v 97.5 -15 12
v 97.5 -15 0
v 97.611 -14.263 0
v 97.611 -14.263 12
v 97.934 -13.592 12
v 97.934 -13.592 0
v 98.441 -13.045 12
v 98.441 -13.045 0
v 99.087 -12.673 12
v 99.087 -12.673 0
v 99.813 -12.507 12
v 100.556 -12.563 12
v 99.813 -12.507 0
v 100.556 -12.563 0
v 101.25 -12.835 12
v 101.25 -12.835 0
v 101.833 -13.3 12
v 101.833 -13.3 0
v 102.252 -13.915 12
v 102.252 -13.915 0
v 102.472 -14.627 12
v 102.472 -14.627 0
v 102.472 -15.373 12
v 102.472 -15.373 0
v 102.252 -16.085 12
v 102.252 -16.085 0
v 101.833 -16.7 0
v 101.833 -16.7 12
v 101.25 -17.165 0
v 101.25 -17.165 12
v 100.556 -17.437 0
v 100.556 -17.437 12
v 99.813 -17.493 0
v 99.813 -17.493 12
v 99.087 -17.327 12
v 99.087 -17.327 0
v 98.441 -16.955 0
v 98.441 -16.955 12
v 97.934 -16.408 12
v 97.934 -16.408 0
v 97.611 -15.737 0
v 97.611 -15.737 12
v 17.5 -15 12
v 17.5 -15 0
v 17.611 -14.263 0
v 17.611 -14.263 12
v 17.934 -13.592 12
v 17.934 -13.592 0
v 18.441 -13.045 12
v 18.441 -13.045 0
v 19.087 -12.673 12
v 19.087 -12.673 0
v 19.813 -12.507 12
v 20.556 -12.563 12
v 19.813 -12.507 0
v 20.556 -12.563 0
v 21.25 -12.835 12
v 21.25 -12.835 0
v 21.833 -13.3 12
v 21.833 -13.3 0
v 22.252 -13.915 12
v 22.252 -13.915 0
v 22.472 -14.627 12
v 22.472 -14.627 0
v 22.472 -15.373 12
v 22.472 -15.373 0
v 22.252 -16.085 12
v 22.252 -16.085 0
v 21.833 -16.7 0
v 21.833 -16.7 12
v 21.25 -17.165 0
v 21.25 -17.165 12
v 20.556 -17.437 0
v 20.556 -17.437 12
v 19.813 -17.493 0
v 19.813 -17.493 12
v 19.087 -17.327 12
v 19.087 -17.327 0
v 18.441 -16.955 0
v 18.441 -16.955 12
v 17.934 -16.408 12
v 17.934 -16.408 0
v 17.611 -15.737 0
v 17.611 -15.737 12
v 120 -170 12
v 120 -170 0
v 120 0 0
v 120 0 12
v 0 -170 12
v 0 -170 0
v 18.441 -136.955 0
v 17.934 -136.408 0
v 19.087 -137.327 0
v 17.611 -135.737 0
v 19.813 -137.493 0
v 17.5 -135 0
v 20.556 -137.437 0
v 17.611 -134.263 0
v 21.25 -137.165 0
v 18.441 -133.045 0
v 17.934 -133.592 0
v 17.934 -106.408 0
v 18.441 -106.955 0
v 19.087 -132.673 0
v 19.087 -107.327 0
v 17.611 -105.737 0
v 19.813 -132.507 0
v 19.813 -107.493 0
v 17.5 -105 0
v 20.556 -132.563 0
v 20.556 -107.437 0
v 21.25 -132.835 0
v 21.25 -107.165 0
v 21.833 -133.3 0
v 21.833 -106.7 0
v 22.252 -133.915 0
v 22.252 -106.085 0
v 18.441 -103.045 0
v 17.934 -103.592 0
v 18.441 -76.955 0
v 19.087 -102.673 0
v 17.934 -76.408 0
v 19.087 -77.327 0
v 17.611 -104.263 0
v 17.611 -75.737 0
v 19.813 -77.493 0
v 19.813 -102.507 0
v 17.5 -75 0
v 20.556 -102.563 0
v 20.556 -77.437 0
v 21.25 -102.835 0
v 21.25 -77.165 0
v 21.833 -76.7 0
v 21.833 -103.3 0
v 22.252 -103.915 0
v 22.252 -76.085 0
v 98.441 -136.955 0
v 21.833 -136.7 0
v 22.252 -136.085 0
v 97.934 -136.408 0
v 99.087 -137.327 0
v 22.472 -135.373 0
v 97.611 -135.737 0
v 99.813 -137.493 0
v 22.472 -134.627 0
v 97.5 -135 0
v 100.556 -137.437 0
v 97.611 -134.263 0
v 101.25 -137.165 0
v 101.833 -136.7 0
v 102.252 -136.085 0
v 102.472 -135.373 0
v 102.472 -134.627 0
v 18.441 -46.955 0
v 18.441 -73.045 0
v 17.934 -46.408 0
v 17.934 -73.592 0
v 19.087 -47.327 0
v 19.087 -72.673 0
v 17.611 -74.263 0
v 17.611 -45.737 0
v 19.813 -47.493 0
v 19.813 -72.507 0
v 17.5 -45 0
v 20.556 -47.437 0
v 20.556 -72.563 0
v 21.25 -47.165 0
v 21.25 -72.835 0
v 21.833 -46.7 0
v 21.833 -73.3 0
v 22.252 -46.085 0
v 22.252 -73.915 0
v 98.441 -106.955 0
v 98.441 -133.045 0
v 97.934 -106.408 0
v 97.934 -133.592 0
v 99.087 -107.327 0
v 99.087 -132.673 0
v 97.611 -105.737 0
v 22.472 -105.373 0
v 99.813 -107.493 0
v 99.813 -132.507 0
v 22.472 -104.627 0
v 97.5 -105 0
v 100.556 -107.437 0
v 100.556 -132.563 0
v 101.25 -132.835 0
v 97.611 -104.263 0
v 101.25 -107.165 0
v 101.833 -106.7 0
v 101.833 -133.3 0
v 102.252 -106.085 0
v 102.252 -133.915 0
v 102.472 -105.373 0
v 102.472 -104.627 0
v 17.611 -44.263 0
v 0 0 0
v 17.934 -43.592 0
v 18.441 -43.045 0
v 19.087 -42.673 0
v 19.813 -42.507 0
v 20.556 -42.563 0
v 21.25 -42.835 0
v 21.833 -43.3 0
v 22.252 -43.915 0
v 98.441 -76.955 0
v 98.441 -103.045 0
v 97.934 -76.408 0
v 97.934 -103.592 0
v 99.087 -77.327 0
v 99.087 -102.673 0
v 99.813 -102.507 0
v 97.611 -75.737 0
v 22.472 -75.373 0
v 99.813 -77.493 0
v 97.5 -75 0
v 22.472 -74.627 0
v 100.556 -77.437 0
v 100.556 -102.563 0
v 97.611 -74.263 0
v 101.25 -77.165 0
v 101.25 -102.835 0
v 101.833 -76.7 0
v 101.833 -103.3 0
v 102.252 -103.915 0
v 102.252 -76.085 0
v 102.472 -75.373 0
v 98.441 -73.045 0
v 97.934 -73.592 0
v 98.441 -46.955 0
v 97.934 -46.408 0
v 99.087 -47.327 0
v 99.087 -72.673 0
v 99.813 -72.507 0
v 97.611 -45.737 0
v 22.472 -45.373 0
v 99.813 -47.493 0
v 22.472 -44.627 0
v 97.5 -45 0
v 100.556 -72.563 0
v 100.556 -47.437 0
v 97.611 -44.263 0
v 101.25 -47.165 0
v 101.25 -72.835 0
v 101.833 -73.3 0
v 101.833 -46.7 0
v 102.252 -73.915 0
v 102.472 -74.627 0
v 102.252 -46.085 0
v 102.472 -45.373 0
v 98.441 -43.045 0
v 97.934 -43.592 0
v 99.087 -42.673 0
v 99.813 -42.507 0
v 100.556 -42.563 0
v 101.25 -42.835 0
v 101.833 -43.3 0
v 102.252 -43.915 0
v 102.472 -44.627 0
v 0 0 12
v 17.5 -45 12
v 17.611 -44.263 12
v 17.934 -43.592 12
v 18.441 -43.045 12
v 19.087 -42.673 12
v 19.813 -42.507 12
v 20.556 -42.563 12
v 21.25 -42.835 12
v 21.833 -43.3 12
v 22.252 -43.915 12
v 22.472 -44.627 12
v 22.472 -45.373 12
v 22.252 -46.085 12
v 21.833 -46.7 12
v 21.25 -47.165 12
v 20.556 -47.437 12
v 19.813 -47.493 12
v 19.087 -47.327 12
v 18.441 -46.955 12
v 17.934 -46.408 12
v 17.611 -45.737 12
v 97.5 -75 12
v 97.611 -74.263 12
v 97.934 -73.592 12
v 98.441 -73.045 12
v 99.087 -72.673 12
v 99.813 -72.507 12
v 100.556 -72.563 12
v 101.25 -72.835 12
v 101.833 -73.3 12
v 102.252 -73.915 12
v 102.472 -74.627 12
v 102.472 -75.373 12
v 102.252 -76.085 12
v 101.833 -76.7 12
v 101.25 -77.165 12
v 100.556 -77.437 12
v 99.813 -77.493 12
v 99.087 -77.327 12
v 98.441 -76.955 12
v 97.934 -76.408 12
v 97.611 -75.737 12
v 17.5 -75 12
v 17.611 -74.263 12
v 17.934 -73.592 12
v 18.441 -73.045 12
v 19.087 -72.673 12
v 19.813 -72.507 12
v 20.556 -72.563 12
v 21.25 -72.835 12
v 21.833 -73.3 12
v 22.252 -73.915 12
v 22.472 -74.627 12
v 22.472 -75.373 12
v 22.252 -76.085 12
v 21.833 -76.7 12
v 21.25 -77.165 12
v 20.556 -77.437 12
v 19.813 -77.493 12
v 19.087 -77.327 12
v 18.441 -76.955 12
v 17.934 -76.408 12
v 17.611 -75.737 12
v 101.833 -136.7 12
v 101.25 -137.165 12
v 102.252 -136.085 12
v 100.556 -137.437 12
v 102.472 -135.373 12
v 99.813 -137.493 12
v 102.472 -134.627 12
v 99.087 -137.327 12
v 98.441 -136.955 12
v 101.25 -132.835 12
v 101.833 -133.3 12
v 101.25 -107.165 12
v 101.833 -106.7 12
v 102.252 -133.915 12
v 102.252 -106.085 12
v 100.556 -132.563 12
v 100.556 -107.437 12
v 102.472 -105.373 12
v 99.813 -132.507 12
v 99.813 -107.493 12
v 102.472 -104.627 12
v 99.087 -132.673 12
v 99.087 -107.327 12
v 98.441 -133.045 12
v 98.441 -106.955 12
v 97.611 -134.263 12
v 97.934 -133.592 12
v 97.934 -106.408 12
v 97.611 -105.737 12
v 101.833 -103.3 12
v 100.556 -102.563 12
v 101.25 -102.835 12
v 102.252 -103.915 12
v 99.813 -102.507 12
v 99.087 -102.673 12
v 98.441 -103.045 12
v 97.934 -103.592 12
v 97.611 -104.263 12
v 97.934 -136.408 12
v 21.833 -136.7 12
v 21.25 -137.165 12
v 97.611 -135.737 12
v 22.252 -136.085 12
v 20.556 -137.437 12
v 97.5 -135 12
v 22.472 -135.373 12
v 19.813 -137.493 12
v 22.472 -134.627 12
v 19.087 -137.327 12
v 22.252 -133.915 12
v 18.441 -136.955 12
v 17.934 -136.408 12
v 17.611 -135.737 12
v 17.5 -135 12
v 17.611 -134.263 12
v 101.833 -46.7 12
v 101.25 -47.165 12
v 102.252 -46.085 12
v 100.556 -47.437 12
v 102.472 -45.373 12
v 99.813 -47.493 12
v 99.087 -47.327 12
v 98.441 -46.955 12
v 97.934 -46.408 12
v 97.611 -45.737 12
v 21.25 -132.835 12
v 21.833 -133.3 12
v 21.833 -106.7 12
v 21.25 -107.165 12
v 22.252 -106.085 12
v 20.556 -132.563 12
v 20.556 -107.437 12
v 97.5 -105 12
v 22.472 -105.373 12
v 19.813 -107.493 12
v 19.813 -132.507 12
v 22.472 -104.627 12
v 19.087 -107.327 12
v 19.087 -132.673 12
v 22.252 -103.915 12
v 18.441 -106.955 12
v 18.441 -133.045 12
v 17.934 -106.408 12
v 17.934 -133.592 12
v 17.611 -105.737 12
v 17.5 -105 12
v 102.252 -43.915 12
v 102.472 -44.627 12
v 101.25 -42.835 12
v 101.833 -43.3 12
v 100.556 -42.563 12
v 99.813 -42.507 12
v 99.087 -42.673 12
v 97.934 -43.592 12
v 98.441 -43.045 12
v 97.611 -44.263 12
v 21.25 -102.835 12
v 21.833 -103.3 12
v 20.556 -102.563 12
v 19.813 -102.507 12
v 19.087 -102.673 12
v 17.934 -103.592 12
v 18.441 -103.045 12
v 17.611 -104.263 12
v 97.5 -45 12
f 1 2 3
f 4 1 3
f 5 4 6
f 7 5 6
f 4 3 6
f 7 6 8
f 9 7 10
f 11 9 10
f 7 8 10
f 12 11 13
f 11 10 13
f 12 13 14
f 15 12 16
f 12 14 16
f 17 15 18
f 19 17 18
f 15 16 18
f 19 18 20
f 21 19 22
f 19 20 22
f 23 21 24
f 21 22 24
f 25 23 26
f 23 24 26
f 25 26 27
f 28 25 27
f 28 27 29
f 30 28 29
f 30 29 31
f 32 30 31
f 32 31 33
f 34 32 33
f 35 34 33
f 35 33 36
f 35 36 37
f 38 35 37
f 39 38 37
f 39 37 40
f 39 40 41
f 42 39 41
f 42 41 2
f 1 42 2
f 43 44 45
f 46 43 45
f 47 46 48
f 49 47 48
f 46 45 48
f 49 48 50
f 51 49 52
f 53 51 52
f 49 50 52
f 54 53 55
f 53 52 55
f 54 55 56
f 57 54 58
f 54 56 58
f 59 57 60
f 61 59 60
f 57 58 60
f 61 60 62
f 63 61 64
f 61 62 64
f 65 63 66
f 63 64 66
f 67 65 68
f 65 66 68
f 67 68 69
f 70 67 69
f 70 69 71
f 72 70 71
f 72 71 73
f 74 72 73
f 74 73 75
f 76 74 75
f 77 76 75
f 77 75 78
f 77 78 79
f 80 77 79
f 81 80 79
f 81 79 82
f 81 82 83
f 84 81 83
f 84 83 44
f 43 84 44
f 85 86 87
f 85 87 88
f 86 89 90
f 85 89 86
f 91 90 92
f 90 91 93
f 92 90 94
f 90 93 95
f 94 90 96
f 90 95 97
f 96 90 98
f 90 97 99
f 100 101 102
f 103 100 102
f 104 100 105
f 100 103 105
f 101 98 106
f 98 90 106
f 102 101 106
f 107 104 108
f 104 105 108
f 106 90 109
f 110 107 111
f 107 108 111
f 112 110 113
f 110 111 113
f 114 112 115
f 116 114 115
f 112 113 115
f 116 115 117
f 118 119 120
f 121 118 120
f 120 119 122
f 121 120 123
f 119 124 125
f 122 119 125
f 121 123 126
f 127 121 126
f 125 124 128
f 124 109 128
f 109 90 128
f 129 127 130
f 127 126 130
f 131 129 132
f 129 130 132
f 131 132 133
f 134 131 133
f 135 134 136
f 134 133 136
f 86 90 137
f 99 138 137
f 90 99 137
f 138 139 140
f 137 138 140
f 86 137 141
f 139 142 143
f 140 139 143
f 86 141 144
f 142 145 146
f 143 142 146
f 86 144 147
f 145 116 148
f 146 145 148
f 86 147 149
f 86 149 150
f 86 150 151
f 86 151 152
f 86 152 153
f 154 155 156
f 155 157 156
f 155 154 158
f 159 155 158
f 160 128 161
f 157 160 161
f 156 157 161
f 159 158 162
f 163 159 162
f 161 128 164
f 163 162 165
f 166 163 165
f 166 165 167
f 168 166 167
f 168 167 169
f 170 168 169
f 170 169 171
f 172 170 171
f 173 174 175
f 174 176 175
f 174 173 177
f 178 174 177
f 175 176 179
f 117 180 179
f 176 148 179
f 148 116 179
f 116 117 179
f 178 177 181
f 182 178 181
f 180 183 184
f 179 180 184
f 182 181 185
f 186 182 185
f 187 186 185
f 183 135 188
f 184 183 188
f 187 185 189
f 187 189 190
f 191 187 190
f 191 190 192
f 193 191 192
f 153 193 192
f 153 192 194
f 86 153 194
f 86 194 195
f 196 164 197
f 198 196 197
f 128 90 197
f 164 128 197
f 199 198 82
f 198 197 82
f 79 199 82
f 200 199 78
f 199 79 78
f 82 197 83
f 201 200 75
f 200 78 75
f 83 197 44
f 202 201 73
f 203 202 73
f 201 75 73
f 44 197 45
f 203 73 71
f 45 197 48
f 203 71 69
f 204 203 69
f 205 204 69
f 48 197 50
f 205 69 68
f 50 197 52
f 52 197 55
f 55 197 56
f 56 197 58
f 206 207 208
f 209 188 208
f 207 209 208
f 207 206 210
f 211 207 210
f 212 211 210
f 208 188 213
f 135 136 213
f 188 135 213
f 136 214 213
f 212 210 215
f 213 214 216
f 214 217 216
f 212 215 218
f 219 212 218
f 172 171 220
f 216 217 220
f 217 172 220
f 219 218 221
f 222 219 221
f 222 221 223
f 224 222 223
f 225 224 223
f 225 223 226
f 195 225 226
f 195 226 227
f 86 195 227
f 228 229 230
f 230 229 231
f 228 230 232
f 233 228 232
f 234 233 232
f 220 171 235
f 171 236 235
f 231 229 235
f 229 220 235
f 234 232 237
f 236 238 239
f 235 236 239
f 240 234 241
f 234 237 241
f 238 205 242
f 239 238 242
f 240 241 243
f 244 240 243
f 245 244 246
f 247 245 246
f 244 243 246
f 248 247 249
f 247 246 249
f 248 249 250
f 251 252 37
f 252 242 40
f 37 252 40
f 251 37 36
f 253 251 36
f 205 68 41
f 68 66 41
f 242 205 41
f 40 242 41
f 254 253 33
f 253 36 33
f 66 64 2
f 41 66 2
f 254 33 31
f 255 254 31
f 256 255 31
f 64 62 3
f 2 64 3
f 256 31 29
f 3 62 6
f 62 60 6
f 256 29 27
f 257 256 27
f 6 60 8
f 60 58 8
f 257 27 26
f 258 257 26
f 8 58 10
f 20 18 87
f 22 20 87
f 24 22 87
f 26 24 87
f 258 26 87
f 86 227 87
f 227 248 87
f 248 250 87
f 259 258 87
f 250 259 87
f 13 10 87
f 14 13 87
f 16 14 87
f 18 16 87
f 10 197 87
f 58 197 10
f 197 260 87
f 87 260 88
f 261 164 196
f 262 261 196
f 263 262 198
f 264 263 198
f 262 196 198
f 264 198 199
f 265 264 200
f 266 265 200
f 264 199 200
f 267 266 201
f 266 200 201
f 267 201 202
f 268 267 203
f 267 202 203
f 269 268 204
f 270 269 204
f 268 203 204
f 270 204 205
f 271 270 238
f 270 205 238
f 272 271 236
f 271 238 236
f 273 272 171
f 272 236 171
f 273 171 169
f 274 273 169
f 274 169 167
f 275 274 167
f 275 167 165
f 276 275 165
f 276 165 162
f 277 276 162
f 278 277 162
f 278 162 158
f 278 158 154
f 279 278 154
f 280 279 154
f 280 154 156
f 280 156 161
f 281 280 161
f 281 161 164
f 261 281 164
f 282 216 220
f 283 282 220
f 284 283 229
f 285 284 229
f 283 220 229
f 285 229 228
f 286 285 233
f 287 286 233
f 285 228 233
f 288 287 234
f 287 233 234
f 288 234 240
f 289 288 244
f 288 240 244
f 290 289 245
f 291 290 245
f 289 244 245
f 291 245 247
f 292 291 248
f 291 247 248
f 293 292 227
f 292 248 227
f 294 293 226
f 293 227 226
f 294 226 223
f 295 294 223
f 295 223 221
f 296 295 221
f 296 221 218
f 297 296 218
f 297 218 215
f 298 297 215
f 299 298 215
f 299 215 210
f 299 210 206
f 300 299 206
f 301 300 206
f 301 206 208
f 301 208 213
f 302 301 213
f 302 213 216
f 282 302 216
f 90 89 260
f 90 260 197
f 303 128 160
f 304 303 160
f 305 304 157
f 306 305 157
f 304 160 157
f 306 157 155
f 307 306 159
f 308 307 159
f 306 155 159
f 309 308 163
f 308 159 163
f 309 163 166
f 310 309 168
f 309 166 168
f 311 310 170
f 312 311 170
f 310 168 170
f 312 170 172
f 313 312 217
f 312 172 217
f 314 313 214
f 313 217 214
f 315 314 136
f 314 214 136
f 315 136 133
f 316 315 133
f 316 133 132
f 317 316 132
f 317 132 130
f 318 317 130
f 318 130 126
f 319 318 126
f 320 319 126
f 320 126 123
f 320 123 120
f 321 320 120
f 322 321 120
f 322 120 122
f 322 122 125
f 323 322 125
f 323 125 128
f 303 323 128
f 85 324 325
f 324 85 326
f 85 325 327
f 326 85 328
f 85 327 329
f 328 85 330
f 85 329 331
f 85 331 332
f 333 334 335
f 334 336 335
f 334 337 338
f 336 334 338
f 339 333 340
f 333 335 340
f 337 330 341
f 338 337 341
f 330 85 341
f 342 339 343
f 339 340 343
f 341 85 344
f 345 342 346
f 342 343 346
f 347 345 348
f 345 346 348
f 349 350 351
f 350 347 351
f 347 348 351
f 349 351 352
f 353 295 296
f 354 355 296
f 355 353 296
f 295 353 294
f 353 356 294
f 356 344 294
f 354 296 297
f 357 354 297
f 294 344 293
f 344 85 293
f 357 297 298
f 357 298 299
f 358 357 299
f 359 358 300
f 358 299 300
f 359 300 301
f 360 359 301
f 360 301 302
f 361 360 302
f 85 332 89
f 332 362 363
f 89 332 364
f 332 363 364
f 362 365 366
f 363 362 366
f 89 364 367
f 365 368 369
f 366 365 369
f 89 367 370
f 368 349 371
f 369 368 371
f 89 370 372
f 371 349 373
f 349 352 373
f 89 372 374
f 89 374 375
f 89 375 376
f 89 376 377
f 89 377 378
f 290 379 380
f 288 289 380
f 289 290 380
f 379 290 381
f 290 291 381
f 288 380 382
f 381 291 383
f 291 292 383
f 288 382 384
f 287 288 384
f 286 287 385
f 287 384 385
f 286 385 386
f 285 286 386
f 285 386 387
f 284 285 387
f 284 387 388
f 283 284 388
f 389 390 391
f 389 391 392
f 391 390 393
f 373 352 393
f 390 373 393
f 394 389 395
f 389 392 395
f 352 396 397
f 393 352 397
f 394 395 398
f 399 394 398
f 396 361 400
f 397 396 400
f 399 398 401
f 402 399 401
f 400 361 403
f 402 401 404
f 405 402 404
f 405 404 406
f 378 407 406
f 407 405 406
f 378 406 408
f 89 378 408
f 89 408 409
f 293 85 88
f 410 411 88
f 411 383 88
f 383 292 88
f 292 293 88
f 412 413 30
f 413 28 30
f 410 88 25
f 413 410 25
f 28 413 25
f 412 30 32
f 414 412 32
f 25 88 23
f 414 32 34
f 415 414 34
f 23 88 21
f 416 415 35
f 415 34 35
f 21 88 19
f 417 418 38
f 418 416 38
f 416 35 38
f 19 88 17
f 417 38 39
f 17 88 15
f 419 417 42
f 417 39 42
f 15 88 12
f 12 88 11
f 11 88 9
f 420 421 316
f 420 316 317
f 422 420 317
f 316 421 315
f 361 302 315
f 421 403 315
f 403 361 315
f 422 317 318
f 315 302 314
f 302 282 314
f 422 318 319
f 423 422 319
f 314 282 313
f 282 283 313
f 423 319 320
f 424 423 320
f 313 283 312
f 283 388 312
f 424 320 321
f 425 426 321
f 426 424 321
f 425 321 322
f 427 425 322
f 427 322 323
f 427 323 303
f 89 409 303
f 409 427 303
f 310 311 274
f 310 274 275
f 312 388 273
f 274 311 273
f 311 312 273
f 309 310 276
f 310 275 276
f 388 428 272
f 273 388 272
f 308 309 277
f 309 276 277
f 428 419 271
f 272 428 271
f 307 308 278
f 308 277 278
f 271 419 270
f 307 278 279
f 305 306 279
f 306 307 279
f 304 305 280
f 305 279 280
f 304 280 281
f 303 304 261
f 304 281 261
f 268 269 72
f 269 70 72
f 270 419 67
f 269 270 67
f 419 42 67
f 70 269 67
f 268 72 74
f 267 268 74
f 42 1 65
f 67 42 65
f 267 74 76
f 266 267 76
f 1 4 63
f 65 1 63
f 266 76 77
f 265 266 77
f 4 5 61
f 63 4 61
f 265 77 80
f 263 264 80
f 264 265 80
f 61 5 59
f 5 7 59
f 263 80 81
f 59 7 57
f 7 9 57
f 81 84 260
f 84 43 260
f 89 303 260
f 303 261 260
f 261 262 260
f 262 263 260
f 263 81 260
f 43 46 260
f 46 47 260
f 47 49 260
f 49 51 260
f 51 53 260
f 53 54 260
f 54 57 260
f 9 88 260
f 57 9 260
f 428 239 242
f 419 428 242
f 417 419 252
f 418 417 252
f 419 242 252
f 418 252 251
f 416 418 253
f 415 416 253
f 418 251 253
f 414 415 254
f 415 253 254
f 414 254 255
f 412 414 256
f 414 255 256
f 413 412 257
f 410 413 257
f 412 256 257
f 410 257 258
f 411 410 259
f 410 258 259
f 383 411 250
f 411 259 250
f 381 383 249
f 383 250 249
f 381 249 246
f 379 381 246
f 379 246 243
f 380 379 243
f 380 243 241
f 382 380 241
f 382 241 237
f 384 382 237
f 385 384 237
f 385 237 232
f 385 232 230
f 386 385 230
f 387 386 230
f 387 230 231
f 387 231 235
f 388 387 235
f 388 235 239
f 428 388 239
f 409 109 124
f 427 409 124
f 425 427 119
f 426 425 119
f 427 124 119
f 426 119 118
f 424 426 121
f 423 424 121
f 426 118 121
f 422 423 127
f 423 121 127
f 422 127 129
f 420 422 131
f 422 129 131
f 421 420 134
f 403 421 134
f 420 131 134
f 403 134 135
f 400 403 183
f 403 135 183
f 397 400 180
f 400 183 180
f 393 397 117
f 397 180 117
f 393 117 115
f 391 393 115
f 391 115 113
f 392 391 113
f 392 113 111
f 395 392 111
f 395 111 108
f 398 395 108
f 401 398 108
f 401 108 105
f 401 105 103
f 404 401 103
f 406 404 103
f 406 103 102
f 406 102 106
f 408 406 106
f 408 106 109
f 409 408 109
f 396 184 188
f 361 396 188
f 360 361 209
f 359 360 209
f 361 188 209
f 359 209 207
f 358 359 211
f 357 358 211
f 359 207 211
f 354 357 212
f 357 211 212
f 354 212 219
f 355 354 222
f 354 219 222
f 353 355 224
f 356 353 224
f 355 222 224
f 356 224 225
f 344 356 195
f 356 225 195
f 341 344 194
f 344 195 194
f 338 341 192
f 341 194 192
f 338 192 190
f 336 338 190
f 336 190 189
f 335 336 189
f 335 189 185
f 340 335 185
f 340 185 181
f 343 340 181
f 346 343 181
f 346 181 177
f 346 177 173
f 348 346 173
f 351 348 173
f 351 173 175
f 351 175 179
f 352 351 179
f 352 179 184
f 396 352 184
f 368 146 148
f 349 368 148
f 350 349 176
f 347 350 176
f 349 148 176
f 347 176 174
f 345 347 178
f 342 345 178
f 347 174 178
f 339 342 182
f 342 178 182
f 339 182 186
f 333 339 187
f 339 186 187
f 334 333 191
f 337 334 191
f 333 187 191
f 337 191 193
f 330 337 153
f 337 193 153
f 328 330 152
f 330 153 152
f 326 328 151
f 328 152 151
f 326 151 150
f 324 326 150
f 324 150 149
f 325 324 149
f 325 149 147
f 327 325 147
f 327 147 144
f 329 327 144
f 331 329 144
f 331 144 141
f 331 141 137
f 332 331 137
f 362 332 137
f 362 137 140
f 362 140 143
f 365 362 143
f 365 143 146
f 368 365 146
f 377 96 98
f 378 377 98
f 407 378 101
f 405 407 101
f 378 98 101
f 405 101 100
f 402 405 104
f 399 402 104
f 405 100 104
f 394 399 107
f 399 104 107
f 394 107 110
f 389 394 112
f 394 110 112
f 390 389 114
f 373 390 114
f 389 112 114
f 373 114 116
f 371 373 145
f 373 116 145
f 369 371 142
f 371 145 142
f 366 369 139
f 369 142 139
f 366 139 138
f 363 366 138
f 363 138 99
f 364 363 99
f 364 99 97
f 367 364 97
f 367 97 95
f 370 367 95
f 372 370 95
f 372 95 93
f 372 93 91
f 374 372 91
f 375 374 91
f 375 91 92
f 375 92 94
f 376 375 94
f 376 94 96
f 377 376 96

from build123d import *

# Parameters (mm, degrees)
F1_DEPTH = 170
F3_D     = 5
F5_D     = 5


with BuildPart() as f1:
    # F0 (on Front) → F1 (new body)
    with BuildSketch(Plane.XZ):
        Polygon((0, 12), (0, 0), (120, 0), (120, 12), (66.9767542527, 12), align=None)
    extrude(amount=F1_DEPTH)

    # F3 (through all)
    with Locations(Plane.XY.offset(12)):
        with Locations((20, -15), (20, -45), (20, -75), (20, -105), (20, -135)):
            Hole(F3_D / 2)

    # F5 (through all)
    with Locations(Plane.XY.offset(12)):
        with Locations((100, -15), (100, -45), (100, -75), (100, -105), (100, -135)):
            Hole(F5_D / 2)


solid = f1.part
